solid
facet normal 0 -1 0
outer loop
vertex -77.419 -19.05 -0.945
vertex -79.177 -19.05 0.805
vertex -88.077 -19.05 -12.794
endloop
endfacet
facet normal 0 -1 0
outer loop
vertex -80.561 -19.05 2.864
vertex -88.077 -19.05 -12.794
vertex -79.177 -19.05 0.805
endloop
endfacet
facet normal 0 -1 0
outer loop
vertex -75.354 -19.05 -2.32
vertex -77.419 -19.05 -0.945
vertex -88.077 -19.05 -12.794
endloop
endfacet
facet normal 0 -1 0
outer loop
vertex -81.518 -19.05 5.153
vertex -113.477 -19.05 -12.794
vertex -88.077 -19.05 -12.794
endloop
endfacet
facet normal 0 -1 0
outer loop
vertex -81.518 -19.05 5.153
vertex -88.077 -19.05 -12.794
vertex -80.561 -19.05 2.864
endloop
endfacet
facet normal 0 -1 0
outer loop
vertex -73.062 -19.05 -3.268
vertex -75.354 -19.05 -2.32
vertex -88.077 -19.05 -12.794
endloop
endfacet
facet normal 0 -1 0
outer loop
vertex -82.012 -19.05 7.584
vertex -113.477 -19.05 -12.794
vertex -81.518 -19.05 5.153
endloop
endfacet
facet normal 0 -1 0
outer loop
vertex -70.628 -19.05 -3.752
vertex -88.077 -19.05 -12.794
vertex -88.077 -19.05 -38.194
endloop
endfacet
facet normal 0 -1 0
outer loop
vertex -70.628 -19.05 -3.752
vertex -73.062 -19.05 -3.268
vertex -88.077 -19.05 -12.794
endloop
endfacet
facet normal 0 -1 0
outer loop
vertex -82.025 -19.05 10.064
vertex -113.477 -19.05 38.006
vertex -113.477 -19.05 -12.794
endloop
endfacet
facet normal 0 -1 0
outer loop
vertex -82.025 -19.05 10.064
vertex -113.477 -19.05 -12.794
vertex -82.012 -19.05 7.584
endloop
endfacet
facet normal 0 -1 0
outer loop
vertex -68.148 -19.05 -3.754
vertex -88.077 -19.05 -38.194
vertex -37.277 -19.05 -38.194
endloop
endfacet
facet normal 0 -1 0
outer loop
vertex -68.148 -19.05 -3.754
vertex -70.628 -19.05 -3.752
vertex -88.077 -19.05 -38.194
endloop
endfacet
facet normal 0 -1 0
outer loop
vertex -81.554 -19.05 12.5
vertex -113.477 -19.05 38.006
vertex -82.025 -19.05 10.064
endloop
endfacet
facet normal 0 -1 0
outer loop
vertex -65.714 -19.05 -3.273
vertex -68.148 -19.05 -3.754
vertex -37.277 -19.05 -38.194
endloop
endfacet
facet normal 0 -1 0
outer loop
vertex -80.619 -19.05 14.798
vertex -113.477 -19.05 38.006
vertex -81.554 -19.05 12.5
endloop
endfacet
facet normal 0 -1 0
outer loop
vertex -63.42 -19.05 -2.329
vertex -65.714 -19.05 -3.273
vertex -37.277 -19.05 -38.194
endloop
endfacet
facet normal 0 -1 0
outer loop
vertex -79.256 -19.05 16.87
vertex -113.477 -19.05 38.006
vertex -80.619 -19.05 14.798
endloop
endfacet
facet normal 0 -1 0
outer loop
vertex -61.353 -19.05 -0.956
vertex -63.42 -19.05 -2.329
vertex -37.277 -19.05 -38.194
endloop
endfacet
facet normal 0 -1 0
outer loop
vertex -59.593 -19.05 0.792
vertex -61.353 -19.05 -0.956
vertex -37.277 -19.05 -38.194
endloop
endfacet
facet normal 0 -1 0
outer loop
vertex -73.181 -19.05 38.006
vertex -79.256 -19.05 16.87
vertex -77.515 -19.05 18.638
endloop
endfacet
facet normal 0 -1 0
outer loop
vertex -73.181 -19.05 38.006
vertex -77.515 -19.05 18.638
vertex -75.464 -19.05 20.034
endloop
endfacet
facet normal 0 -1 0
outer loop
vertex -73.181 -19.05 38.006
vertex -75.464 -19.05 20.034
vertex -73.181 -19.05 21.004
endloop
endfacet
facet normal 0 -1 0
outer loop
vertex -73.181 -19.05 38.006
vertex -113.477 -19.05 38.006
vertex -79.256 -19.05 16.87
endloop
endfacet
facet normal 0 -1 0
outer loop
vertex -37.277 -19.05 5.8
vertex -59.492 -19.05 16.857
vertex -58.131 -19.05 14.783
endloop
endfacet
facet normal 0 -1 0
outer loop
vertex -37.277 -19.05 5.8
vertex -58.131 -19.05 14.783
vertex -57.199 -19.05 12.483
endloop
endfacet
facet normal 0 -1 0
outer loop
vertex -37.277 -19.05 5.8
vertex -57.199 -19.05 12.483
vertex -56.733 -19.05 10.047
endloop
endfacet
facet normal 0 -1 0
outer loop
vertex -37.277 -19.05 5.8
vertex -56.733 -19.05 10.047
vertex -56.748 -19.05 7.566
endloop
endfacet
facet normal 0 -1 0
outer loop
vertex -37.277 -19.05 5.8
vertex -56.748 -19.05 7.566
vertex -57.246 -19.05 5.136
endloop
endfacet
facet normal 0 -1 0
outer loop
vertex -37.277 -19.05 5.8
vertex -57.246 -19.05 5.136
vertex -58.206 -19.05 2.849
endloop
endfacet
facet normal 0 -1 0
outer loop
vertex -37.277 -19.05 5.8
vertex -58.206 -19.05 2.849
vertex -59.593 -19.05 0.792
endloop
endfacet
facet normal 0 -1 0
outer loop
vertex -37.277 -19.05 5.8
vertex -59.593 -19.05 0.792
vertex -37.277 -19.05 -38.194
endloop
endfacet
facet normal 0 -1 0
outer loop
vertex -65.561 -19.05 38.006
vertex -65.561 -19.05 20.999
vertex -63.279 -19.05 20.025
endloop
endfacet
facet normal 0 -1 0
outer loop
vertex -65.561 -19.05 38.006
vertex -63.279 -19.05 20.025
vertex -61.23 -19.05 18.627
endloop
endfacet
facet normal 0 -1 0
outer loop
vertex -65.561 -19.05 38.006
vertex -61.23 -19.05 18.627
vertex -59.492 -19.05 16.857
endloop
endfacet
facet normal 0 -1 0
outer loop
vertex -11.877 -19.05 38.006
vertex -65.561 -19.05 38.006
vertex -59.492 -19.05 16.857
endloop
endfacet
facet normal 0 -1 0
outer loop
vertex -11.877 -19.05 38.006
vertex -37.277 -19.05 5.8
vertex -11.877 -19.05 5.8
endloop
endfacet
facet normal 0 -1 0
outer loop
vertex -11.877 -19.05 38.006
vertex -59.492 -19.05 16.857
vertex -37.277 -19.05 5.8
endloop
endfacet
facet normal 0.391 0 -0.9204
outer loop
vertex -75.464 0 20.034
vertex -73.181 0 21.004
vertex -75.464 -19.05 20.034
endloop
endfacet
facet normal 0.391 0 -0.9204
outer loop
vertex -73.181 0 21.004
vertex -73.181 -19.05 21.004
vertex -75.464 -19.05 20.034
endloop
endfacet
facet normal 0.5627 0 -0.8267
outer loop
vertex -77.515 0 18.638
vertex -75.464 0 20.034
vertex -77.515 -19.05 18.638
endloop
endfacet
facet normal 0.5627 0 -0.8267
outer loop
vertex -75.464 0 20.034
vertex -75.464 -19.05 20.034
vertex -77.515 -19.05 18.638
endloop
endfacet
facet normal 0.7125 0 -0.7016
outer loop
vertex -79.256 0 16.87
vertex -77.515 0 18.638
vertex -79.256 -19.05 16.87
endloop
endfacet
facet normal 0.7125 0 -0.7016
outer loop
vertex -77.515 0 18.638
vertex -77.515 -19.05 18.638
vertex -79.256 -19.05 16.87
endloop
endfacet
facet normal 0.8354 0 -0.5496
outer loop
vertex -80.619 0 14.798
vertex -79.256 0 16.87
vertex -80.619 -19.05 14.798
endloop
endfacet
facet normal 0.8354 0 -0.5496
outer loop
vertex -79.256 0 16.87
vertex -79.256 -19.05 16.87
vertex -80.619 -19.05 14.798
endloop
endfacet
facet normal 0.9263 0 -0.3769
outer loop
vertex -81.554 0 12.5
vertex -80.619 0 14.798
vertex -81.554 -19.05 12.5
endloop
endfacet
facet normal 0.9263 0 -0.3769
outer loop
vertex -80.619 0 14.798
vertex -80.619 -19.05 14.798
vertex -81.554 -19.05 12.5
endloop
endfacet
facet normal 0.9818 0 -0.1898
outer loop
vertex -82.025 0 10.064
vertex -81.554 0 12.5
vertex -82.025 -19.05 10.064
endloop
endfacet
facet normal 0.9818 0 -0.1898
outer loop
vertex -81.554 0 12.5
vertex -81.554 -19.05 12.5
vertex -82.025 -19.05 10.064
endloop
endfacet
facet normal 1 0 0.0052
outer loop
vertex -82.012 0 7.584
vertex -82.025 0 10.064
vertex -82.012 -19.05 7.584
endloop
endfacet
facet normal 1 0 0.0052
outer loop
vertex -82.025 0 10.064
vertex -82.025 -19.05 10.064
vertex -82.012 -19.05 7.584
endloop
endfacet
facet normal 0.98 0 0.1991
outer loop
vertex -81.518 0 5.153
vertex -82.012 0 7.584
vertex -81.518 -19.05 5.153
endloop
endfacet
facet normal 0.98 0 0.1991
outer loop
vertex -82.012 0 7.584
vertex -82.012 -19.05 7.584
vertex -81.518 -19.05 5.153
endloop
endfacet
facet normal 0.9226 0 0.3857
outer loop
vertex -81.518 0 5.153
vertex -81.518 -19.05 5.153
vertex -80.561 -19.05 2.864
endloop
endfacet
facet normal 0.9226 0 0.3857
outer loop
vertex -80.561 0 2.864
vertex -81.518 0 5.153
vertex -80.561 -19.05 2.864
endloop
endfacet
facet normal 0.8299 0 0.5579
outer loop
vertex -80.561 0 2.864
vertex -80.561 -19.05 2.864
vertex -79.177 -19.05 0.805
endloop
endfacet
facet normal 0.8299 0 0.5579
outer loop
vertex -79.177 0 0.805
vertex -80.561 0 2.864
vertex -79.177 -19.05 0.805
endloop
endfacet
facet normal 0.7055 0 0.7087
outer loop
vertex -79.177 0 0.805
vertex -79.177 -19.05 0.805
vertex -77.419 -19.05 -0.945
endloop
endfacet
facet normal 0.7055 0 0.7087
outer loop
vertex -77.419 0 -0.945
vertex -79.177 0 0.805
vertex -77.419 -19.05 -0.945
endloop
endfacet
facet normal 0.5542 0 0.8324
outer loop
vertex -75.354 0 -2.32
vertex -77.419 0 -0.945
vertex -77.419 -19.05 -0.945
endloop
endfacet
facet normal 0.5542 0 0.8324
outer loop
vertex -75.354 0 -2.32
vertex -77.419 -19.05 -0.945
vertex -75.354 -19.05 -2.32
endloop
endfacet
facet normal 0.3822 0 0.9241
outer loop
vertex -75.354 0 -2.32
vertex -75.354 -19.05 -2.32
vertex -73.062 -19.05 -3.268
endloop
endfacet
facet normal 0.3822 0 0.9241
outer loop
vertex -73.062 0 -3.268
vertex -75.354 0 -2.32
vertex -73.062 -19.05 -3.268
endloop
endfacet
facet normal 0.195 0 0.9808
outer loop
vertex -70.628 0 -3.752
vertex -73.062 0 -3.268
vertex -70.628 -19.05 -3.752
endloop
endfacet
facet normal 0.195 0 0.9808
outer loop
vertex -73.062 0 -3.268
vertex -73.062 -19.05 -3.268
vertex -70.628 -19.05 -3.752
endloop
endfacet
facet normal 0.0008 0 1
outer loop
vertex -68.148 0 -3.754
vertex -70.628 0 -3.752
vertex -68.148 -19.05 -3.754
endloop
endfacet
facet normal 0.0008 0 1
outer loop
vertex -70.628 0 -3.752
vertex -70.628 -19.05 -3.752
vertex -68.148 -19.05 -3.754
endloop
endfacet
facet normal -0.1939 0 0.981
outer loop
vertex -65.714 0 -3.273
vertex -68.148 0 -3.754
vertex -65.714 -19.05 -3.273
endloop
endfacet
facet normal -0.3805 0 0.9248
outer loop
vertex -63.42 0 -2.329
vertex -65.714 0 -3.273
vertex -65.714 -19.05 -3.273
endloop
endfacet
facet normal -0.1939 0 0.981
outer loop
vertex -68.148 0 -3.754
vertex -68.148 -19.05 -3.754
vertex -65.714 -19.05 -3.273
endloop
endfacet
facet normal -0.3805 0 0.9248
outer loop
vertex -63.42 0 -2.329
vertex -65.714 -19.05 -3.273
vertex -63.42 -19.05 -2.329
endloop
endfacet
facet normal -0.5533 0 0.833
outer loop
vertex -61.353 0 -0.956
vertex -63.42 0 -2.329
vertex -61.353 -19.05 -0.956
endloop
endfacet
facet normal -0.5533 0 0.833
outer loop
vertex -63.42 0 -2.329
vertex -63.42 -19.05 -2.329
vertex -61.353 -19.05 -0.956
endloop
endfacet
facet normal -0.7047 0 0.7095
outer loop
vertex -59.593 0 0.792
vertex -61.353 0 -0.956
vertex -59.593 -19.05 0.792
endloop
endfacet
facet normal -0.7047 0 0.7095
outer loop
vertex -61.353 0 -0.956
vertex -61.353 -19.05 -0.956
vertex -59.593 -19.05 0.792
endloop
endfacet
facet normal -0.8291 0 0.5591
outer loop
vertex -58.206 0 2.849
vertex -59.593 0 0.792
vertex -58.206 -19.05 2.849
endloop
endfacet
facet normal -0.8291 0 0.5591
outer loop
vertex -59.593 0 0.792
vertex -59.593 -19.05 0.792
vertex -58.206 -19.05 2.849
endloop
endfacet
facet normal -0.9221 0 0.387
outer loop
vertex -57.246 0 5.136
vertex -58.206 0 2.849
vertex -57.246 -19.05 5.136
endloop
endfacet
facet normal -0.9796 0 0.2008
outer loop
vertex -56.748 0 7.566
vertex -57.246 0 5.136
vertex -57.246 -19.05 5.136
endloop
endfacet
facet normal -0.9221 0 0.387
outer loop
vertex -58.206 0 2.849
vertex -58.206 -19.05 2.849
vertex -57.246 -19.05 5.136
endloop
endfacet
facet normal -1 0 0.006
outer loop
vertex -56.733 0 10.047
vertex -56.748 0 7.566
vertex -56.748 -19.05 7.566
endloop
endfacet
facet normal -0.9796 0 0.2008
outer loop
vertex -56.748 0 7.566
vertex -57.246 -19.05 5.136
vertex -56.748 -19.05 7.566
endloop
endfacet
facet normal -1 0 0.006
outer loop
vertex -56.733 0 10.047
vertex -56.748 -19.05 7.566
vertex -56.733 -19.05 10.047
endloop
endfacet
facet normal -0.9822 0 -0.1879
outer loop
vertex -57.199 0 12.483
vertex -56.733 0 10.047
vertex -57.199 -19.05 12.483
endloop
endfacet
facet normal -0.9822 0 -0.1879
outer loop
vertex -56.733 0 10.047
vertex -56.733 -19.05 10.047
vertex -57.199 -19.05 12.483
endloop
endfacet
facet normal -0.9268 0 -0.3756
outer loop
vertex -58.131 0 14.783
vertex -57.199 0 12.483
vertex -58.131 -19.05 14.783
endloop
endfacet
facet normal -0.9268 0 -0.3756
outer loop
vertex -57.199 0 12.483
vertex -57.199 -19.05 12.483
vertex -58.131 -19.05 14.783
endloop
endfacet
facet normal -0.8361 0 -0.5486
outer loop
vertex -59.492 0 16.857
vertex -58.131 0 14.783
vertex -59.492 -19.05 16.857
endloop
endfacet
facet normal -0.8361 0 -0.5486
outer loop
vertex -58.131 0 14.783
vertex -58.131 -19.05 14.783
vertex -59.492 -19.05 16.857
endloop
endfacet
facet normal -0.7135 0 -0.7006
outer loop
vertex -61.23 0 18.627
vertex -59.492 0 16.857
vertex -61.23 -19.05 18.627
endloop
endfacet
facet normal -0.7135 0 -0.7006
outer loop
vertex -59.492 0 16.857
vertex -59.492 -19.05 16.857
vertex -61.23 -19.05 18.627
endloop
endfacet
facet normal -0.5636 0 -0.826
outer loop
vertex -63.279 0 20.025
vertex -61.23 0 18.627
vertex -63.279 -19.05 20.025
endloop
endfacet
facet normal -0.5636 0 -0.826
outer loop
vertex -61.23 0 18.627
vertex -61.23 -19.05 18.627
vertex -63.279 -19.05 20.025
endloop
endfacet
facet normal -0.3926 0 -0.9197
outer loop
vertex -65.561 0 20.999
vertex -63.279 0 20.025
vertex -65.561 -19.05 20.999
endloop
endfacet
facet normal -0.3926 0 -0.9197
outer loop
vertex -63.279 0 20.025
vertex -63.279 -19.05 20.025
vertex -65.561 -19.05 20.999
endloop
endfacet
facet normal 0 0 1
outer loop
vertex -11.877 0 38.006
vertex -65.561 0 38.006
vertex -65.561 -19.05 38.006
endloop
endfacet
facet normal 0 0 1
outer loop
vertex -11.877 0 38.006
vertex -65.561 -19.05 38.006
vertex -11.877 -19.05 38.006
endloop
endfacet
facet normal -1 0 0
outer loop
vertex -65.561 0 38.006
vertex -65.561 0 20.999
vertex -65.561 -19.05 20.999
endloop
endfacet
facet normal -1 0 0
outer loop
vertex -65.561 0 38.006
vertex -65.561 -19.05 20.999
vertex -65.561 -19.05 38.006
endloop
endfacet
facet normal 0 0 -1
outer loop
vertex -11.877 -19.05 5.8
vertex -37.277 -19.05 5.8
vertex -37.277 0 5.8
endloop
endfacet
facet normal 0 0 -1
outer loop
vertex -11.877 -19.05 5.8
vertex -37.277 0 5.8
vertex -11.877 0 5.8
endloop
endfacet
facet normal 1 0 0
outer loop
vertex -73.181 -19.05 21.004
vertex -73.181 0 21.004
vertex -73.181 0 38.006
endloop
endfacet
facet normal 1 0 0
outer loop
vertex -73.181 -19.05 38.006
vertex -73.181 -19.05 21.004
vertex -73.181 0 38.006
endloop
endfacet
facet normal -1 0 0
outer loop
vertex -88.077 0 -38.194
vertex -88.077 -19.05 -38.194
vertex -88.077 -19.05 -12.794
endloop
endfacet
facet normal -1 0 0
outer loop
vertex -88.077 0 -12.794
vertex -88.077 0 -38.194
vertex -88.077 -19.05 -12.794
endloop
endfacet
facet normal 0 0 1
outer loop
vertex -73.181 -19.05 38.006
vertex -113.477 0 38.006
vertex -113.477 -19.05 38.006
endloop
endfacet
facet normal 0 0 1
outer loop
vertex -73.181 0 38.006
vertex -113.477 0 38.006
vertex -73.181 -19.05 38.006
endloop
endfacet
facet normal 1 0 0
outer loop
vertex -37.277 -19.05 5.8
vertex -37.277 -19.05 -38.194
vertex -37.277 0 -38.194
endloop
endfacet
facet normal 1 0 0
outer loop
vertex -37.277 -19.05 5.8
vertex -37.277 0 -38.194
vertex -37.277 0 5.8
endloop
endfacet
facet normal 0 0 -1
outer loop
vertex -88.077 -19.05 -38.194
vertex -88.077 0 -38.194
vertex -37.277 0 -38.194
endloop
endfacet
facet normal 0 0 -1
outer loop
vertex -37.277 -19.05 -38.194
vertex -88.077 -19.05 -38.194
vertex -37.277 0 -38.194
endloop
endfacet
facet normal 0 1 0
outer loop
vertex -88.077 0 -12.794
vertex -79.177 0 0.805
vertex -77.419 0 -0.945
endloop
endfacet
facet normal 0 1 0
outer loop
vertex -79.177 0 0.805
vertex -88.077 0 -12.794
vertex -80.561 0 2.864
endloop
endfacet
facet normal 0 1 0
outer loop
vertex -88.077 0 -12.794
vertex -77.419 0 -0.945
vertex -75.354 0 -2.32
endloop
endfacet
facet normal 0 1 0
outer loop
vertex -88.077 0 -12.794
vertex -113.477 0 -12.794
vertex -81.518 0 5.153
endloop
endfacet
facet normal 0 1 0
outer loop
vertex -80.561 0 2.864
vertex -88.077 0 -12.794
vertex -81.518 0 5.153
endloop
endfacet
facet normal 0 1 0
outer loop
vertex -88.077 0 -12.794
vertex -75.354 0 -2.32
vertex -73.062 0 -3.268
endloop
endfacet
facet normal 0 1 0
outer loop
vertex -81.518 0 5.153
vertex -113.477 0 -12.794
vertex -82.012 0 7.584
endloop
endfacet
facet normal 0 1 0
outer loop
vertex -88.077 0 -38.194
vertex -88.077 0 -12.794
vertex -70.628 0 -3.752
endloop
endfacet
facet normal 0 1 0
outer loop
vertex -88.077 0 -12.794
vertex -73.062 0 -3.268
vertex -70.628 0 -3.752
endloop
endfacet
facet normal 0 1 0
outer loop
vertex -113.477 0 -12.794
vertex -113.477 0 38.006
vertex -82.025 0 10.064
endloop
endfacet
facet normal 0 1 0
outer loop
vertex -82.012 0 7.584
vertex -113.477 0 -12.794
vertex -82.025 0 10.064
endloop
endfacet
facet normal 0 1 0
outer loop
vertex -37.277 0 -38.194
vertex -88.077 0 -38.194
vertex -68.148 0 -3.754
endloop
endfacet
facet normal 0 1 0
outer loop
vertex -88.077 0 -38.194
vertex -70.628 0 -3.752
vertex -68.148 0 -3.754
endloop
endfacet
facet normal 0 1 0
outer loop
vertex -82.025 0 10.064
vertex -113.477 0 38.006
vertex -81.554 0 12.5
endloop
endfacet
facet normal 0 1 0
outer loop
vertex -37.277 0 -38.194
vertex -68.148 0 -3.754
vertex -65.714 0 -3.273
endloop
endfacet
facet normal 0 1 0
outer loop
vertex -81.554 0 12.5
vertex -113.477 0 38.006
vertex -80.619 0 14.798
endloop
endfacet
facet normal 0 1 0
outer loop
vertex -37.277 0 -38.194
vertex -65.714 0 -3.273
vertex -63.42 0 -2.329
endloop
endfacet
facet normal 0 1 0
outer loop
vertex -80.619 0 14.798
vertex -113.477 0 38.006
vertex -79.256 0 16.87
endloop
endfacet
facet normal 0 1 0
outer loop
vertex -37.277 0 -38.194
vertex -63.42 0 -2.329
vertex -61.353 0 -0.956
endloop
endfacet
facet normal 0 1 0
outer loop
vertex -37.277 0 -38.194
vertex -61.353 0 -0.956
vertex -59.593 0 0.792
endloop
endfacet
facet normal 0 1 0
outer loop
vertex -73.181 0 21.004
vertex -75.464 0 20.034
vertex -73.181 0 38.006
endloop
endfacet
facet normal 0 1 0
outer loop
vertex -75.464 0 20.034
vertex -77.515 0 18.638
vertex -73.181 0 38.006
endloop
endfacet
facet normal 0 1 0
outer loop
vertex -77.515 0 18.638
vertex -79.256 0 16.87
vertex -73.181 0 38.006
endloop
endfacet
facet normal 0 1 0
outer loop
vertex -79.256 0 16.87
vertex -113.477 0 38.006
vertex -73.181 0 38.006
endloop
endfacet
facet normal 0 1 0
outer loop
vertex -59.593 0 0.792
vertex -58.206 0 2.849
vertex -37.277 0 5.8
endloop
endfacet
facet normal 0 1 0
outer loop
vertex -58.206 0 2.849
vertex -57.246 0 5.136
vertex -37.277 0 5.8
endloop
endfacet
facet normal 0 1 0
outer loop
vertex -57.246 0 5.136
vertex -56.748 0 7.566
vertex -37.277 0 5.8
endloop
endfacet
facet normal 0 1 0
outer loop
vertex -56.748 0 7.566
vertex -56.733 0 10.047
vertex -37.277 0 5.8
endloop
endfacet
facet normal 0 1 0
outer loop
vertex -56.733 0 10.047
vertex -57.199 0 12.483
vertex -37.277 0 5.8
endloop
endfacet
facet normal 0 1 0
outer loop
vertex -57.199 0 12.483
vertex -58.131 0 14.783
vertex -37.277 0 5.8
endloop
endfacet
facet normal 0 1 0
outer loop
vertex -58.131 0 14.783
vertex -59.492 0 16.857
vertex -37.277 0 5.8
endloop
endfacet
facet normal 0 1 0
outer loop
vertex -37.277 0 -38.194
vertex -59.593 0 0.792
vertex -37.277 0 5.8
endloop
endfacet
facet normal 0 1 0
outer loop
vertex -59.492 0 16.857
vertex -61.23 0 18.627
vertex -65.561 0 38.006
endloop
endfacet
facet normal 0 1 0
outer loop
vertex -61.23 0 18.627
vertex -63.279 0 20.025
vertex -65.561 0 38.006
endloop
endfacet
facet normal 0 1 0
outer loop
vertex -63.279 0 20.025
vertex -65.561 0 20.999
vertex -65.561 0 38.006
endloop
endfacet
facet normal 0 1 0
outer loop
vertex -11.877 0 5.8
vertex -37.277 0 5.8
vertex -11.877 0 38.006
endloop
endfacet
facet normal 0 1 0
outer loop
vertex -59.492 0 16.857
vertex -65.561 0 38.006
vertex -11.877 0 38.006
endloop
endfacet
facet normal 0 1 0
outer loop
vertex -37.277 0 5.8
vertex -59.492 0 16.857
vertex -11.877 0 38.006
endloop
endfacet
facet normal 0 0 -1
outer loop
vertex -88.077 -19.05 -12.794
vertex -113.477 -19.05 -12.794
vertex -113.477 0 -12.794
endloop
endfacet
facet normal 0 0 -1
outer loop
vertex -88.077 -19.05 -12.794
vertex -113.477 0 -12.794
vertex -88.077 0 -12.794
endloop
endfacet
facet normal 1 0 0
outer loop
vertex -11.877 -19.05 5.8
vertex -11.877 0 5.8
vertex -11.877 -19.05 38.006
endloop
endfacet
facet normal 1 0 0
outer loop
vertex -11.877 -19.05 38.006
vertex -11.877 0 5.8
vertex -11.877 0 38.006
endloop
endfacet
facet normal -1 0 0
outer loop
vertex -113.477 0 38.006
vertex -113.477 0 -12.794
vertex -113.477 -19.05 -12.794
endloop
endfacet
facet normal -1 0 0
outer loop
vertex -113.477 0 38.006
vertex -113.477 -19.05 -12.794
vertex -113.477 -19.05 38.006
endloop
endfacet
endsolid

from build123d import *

# Parameters (mm, degrees)
F0_W     = 101.6
F0_H     = 76.2
F1_DEPTH = 19.05
F2_W     = 25.4
F2_H     = 25.4
F3_DEPTH = 19.05
F4_W     = 25.4
F4_H     = 43.99407
F5_DEPTH = 19.05
F6_R     = 12.7
F7_DEPTH = 19.05
F8_W     = 7.62
F8_H     = 25.4
F9_DEPTH = 19.05


with BuildPart() as f1:
    # F0 (on Front) → F1 (new body)
    with BuildSketch(Plane.XZ):
        with Locations((-62.676735, -0.094059)):
            Rectangle(F0_W, F0_H)
    extrude(amount=F1_DEPTH)

    # F2 (on face) → F3 (cut)
    with BuildSketch(Plane.XZ.offset(19.05)):
        with Locations((-100.776735, -25.494059)):
            Rectangle(F2_W, F2_H)
    extrude(amount=-F3_DEPTH, mode=Mode.SUBTRACT)

    # F4 (on face) → F5 (cut)
    with BuildSketch(Plane.XZ.offset(19.05)):
        with Locations((-24.576735, -16.197024)):
            Rectangle(F4_W, F4_H)
    extrude(amount=-F5_DEPTH, mode=Mode.SUBTRACT)

    # F6 (on face) → F7 (cut)
    with BuildSketch(Plane.XZ.offset(19.05)):
        with Locations((-69.379374, 8.886294)):
            Circle(F6_R)
    extrude(amount=-F7_DEPTH, mode=Mode.SUBTRACT)

    # F8 (on face) → F9 (cut, through all)
    with BuildSketch(Plane.XZ.offset(19.05)):
        with Locations((-69.371011, 25.305941)):
            Rectangle(F8_W, F8_H)
    extrude(amount=-F9_DEPTH, mode=Mode.SUBTRACT)


solid = f1.part
